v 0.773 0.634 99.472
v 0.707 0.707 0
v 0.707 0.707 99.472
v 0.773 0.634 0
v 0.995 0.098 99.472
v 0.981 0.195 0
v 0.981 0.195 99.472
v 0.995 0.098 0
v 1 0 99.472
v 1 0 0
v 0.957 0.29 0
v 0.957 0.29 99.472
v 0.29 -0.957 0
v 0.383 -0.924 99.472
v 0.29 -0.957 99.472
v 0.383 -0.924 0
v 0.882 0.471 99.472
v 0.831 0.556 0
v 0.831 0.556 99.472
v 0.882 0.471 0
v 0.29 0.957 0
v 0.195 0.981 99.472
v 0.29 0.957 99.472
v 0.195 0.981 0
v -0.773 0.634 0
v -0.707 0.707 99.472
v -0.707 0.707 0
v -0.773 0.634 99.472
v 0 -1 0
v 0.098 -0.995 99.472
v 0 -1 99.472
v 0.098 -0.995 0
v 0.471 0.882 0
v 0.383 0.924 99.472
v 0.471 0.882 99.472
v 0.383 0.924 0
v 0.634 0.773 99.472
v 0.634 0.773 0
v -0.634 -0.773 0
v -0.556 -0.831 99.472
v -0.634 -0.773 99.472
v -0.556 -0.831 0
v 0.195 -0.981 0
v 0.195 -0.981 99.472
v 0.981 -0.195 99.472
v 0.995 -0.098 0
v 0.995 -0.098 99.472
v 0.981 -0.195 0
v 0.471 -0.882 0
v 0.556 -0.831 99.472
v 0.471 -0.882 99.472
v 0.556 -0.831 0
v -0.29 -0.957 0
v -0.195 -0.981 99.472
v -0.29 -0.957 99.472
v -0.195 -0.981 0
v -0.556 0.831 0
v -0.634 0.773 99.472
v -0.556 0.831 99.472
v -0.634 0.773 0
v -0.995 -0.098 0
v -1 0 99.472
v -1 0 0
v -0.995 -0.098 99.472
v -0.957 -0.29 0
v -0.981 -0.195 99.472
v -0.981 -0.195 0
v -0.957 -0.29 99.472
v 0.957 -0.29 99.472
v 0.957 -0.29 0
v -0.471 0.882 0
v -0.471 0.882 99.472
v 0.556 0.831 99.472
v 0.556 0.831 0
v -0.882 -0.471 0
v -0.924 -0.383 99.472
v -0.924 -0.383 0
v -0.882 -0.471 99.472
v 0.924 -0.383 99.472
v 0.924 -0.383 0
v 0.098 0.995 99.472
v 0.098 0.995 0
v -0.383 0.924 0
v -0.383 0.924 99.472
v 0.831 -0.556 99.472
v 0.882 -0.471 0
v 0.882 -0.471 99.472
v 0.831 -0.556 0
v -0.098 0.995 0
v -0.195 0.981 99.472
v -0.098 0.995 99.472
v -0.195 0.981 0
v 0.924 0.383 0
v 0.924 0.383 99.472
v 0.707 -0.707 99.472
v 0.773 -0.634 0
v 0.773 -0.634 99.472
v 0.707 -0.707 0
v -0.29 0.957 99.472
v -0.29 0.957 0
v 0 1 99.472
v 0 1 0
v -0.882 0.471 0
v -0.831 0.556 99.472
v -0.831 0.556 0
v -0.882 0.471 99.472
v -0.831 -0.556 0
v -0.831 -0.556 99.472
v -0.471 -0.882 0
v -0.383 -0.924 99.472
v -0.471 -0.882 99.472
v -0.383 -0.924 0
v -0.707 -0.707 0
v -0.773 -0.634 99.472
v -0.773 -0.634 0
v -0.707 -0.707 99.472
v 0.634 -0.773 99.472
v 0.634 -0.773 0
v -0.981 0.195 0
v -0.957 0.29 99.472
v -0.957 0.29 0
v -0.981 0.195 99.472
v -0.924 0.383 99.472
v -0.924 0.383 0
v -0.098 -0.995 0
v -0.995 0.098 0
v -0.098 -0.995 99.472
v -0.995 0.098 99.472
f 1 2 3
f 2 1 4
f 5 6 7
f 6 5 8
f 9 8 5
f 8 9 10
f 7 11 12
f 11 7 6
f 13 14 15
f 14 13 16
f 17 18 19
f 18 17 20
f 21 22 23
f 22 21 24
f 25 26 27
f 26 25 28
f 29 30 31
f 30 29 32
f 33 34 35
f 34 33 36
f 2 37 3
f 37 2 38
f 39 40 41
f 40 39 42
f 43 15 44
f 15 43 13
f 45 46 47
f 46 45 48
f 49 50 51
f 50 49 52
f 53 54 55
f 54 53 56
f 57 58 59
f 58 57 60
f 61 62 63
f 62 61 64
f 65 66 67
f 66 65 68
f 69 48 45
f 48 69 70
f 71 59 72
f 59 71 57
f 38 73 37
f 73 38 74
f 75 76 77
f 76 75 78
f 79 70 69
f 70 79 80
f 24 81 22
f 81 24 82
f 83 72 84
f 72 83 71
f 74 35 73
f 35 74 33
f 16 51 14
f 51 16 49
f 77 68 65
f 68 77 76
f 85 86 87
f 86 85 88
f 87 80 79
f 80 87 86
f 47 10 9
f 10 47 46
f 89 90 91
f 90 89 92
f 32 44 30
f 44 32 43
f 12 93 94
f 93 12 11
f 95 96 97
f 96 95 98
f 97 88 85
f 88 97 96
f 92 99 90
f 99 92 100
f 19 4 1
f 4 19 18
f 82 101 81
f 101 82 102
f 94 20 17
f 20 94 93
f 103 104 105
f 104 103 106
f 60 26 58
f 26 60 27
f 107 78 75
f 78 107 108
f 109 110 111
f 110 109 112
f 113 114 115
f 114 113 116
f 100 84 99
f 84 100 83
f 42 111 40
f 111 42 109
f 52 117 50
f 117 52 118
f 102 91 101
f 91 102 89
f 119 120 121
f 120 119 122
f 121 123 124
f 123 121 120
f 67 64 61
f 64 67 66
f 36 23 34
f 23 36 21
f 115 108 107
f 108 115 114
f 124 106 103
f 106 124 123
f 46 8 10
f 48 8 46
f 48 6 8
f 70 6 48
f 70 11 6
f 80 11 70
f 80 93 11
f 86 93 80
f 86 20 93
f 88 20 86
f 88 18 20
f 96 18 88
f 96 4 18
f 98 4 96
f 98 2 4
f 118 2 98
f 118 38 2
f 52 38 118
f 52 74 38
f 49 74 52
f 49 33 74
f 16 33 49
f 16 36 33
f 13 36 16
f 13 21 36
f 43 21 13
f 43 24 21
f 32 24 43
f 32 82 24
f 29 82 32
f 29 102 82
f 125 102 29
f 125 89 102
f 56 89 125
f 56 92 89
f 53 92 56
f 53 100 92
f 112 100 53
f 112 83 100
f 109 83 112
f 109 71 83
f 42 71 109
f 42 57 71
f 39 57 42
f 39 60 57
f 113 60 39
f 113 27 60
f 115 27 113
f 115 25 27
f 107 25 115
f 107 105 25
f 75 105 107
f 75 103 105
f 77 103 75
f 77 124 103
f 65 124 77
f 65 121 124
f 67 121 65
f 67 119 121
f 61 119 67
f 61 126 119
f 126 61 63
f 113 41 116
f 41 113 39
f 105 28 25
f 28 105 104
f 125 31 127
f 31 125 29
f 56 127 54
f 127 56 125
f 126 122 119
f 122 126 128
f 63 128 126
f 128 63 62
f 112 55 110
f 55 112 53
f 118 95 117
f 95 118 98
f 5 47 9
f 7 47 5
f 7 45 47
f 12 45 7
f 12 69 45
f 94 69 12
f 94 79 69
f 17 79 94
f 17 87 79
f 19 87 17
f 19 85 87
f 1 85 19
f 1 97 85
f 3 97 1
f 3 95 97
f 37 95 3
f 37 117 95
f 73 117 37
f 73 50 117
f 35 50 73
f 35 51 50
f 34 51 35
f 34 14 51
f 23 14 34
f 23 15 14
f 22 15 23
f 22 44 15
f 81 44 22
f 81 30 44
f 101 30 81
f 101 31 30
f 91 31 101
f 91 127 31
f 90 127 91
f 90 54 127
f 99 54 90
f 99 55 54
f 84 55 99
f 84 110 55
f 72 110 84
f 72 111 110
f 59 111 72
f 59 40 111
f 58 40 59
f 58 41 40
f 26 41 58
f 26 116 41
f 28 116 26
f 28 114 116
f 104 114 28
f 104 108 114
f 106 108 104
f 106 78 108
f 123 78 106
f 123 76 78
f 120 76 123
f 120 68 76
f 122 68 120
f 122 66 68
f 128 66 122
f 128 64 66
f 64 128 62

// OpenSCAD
resolution = 64;

module cyl(h, r, center) {
	cylinder(h=h, r=r, center=center, $fn=resolution);
}

module tube(h, d, hd, flr) {
	d2 = d - hd;
	difference(){
		 cyl(h=h, d=d, center=true);
		 translate([0,0,flr]){
		 cyl(h=h-flr, d=hd, center=true, $fn=resolution);};
		};
}

module needle() {
	hole_dia = 0.75;	//Hole diameter
	ext_dia = 1;		//External diameter
	length = 80;		//Length
	tip_length = 2;	//Length of the tip
	e=0.125;			// Epsilon (width of sharp point)

	difference(){
		union(){
		 cyl(h=length, d1=ext_dia, d2=hole_dia-e, center=true, $fn=resolution);
		 cyl(h=tip_length, d=ext_dia, center=true, $fn=resolution);
		};
	cyl(h=length+tip_length, d=hole_dia, center=true, $fn=resolution);};
}

module cup(len, dia, hole_dia) {
	// TODO for etancheity, recess/
	cup_width = 1;
	difference() {
	union() {
	 tube(h=len, d=dia, hd=dia-cup_width, flr=10);
	 translate([]){cyl(h=1.25, d=2*hole_dia, center=true, $fn=resolution);};
	}
	 cyl(h=len, d=hole_dia, center=true, $fn=resolution);
	}
}

module plunger(len, dia) {
trig_len = 8;
plung_dia = 2;
plung_len = 10;
union() {


cyl(h=trig_len, d=dia, center=false);//cyl haut
translate([0,0,trig_len]){cyl(h=len-plung_len, d=plung_dia, center=false);};// tige
translate([0,0,len-plung_len]){cyl(h=plung_len, d=dia, center=false);};// cyl bas
};
}

// cap = pi r r h 
module syringe(cap, w) {
	len = (cap / ((w/2)*(w/2)*PI)); // TODO add what's taken by the inside thingie
	echo("cap=",cap," w=", w, " len=", len);
	cup(len, dia=w, hole_dia=1);
	translate([0, 0, -.5*len]){
	 needle();
	};
	plunger(len, w);
}


/*
	Capacity, width

*/
syringe(5000,  8);
